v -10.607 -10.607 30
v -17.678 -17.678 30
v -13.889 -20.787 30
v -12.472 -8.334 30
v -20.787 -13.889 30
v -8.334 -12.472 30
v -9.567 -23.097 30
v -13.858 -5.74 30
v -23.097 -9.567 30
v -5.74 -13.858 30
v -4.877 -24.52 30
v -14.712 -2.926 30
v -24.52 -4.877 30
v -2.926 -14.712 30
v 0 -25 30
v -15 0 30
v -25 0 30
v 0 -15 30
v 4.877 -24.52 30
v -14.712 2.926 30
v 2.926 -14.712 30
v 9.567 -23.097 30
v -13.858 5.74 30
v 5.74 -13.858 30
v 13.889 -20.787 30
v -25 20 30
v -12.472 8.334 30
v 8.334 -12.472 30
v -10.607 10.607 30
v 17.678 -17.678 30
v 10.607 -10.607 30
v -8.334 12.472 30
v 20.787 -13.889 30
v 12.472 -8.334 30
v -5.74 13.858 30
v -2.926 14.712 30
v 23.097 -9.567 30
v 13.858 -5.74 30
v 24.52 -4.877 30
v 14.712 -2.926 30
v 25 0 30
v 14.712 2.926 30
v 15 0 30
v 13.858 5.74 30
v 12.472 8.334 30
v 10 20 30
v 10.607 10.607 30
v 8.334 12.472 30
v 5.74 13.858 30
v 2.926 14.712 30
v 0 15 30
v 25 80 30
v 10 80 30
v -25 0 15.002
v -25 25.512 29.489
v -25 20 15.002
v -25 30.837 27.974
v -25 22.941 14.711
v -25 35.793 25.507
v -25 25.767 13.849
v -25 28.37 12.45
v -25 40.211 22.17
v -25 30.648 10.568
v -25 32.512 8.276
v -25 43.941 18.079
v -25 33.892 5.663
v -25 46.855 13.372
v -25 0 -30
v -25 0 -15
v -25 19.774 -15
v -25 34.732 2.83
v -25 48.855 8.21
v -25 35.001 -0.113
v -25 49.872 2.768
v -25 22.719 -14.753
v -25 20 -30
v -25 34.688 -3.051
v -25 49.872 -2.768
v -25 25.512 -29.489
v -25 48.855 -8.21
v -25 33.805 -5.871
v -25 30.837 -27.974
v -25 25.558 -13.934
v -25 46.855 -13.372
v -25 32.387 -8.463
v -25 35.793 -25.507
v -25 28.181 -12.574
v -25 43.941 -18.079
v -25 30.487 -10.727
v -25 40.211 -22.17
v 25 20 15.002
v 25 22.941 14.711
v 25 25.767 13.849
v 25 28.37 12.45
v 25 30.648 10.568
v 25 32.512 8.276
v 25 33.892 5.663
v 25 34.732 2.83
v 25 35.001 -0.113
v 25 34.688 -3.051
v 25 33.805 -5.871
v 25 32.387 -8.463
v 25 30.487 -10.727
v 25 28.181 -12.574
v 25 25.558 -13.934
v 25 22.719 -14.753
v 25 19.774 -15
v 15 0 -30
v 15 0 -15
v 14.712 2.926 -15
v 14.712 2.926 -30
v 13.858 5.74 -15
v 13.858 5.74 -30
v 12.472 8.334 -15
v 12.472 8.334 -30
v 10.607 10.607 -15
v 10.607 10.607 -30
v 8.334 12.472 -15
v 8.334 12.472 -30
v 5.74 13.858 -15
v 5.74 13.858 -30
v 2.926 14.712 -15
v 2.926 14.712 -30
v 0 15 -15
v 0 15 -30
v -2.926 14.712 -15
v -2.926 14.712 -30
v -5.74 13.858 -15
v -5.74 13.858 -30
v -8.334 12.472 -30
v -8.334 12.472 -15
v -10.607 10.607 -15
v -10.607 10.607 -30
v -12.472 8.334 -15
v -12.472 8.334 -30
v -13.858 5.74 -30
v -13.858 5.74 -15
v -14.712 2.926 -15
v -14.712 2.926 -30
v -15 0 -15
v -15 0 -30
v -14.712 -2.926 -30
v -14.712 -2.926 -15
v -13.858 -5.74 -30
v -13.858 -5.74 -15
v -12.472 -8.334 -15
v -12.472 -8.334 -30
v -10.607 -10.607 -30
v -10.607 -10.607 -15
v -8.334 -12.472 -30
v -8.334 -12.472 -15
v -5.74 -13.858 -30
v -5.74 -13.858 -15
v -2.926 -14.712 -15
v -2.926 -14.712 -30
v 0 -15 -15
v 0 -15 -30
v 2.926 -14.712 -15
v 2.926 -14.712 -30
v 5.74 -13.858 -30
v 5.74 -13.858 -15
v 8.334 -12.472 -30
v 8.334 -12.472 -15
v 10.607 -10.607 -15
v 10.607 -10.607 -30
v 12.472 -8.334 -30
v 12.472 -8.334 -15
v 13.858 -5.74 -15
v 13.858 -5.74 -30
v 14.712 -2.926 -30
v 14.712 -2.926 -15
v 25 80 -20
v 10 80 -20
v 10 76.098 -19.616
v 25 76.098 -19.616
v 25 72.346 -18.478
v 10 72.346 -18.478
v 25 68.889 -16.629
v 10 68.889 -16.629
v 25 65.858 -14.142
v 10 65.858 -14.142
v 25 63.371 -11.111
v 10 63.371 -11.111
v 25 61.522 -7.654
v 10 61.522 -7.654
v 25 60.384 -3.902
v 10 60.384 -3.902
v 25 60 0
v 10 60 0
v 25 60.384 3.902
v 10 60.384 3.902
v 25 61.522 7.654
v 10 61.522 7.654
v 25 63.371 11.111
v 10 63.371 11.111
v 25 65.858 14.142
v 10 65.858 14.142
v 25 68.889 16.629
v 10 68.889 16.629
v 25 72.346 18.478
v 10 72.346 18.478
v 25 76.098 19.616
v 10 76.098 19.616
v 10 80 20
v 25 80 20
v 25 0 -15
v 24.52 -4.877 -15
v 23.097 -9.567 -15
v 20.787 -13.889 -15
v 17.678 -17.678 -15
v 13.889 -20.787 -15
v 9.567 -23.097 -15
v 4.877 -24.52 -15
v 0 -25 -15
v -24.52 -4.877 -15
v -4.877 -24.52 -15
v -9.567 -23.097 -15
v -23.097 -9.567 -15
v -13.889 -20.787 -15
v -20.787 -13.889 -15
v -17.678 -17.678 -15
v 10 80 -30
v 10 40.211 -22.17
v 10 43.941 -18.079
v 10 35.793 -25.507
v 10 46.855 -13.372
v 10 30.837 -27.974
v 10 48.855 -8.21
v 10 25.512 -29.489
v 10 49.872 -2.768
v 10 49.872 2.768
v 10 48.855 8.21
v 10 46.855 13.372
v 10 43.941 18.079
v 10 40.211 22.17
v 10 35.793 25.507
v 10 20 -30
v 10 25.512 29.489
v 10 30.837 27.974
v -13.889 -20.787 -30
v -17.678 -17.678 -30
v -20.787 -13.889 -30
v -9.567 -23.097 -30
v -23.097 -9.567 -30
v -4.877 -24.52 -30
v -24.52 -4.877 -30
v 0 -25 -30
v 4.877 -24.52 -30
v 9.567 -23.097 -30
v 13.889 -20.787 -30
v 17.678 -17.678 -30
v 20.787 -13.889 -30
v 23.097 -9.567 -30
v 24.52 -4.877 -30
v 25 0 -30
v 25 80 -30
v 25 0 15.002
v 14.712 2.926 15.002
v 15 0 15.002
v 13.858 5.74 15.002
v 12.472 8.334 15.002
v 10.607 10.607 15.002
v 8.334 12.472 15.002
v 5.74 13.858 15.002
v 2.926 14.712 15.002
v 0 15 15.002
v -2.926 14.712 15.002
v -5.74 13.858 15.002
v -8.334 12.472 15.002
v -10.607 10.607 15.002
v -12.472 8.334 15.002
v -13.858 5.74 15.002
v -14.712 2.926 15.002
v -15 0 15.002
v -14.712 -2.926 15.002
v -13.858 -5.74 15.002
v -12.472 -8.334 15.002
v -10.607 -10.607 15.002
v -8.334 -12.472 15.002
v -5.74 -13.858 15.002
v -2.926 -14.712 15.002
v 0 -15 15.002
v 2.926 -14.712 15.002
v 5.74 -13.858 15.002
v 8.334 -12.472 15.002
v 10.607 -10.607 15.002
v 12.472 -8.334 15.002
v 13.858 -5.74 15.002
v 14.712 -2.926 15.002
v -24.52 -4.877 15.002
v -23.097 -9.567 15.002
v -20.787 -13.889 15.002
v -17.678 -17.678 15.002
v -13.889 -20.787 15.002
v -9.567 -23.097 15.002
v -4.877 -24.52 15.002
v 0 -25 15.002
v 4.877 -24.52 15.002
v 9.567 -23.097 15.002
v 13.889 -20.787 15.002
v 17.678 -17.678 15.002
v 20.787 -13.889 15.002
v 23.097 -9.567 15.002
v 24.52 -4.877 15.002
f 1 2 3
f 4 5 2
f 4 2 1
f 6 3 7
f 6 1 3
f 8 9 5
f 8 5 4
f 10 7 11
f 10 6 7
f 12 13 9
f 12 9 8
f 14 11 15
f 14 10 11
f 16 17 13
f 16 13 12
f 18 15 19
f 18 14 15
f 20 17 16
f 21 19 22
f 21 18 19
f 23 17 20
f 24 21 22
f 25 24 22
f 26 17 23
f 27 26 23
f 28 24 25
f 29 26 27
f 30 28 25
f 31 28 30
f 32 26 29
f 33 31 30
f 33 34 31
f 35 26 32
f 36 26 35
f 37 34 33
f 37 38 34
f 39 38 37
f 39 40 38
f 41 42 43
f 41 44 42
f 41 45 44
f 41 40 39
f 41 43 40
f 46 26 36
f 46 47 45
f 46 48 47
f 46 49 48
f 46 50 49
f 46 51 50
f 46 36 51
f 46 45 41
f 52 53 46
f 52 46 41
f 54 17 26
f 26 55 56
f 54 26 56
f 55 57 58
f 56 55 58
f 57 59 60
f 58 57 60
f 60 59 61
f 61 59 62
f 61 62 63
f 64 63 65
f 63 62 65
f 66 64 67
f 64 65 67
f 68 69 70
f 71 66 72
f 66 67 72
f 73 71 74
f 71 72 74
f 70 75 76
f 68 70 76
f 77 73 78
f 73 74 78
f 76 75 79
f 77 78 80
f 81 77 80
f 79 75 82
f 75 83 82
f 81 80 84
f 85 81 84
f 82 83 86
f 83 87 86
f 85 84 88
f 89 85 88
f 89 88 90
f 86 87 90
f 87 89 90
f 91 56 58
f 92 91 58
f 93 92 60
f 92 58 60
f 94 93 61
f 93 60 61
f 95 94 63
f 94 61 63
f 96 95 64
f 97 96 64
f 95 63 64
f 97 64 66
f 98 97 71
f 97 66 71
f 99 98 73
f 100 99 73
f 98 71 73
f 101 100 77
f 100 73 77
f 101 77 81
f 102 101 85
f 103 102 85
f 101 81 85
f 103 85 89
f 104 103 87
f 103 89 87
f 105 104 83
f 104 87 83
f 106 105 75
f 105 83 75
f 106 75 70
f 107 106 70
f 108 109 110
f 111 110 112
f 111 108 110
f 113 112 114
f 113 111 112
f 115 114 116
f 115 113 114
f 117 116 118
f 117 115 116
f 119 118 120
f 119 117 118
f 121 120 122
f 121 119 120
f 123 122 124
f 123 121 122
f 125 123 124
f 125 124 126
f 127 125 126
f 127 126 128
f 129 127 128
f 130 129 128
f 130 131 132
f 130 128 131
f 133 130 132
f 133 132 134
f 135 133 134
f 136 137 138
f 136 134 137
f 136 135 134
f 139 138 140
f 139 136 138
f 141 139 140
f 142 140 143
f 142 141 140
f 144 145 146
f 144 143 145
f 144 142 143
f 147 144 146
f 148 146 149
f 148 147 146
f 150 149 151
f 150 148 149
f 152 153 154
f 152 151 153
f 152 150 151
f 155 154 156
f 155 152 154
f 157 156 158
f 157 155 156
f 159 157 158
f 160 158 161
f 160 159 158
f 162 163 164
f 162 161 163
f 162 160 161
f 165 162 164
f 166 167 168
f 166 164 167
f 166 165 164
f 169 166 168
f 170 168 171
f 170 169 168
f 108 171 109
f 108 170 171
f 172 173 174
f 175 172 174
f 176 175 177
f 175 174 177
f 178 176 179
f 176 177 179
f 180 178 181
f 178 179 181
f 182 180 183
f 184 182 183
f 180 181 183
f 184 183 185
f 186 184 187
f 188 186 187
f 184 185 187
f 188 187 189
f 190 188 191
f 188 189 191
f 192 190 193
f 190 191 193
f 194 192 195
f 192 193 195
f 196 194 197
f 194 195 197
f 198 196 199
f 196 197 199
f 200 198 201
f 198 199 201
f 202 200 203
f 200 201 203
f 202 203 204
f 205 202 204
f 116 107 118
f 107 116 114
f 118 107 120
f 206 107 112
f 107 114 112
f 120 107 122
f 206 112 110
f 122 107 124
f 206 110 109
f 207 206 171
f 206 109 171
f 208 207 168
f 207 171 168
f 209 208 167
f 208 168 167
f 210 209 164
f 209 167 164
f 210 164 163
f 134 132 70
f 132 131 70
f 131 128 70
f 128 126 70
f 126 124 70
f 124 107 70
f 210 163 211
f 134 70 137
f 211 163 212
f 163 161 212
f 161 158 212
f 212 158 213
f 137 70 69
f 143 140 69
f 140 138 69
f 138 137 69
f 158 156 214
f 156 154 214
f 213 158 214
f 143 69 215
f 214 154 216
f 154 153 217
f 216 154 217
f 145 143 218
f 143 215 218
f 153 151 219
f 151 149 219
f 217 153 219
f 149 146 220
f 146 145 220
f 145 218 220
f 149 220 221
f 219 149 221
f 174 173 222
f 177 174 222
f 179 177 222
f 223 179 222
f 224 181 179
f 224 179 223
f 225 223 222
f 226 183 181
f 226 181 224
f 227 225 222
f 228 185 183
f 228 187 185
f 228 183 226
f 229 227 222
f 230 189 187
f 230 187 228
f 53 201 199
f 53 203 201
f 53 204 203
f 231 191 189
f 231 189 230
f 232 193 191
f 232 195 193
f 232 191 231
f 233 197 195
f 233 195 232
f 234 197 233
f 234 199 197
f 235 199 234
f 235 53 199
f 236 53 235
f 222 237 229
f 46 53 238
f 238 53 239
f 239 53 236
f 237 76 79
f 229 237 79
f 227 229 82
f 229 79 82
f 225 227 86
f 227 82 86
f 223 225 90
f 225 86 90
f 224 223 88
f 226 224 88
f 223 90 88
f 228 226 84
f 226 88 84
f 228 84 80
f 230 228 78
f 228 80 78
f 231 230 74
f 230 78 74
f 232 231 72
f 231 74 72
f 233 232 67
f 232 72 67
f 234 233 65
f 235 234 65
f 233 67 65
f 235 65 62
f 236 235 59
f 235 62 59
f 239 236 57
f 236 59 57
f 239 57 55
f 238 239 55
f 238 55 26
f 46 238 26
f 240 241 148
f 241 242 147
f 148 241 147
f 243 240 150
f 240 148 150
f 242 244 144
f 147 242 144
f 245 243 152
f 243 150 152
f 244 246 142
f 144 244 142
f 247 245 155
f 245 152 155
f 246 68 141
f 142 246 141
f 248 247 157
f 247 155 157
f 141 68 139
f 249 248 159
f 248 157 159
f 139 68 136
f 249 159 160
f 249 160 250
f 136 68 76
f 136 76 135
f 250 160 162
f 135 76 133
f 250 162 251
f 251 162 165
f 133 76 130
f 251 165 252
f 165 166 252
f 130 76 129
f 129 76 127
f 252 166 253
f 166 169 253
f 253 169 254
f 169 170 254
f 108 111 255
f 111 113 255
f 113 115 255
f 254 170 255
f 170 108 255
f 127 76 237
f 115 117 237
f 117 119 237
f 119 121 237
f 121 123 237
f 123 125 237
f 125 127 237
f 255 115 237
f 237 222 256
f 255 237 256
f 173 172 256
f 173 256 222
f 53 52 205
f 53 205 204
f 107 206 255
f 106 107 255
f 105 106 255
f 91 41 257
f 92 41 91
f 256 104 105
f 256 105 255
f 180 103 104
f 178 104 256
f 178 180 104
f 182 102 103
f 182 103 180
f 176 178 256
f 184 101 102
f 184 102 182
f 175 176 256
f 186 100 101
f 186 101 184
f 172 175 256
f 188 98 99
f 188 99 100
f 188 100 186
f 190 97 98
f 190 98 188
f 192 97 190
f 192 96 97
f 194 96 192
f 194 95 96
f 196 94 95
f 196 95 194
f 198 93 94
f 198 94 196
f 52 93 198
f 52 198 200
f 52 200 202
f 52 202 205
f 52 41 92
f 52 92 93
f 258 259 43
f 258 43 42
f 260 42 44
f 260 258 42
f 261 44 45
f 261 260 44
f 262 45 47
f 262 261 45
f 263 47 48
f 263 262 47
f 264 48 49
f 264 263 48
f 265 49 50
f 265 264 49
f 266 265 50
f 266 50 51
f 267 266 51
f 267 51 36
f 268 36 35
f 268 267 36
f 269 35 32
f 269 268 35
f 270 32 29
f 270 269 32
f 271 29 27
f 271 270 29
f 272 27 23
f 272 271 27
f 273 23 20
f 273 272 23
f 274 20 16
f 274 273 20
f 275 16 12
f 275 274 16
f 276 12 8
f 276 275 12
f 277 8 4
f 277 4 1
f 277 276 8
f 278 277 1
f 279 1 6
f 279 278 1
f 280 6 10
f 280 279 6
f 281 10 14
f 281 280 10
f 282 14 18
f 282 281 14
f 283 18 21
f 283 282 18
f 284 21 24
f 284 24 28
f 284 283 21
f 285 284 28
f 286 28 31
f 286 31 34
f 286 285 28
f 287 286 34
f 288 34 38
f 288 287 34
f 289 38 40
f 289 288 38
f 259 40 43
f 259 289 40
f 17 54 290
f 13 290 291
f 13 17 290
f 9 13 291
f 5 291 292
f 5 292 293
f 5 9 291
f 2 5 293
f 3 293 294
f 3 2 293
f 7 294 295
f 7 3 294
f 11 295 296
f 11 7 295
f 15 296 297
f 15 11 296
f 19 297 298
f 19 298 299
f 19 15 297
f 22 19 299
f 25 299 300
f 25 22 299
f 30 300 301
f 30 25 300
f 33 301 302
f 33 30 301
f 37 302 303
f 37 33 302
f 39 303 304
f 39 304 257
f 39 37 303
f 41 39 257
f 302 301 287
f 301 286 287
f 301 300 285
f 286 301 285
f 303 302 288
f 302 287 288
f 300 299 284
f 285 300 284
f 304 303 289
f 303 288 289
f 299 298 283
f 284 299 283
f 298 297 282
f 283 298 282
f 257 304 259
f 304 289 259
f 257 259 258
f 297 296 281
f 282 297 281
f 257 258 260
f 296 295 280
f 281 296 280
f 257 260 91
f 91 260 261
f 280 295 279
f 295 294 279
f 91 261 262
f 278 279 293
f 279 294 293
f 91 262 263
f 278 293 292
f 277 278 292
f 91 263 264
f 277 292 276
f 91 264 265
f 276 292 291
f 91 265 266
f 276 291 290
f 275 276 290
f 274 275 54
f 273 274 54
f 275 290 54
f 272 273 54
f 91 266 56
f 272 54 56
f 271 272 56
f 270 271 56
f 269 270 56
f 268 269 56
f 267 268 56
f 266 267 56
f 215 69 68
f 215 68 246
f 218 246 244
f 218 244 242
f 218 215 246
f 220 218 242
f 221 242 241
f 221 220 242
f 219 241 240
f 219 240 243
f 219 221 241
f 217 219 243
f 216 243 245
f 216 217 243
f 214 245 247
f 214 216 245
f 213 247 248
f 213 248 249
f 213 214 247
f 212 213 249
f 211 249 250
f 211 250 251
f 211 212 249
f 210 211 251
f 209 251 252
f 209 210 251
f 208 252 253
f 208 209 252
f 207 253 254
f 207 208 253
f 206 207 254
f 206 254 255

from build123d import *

# Parameters (mm, degrees)
SKETCH1_R           = 15
BOSS_EXTRUDE1_DEPTH = 30
SKETCH2_R           = 20
CUT_EXTRUDE1_DEPTH  = 16
BOSS_EXTRUDE2_DEPTH = 35
CUT_EXTRUDE3_DEPTH  = 51


with BuildPart() as part:
    # Sketch1 → Boss-Extrude1 (new body, symmetric)
    with BuildSketch(Plane.XY):
        with BuildLine():
            Line((25, 0), (25, 80))
            Line((25, 80), (10, 80))
            Line((10, 80), (10, 22.912878475))
            Line((10, 22.912878475), (10, 20))
            Line((10, 20), (-25, 20))
            Line((-25, 20), (-25, 0))
            ThreePointArc((-25, 0), (0, -25), (25, 0))
        make_face()
        Circle(SKETCH1_R, mode=Mode.SUBTRACT)
    extrude(amount=BOSS_EXTRUDE1_DEPTH, both=True)

    # Sketch2 → Cut-Extrude1 (cut, through all)
    with BuildSketch(Plane.ZY.offset(-10)):
        with Locations((0, 80)):
            Circle(SKETCH2_R)
    extrude(amount=-CUT_EXTRUDE1_DEPTH, mode=Mode.SUBTRACT)

    # Sketch4 → Boss-Extrude2 (add)
    with BuildSketch(Plane.ZY.offset(25)):
        with BuildLine():
            Line((-15, 20), (-30, 20))
            ThreePointArc((-30, 20), (0, 50), (30, 20))
            Line((30, 20), (15, 20))
            ThreePointArc((15, 20), (0, 35), (-15, 20))
        make_face()
    extrude(amount=-BOSS_EXTRUDE2_DEPTH)

    # Sketch5 → Cut-Extrude3 (cut, through all)
    with BuildSketch(Plane.ZY.offset(25)):
        with BuildLine():
            Line((-15, 19.774418989), (-15, -47.367007727))
            Line((-15, -47.367007727), (15.001696131, -47.367007727))
            Line((15.001696131, -47.367007727), (15.001696131, -44.584519051))
            Line((15.001696131, -44.584519051), (15.001696131, 20))
            ThreePointArc((15.001696131, 20), (-0.112793694, 35.001272092), (-15, 19.774418989))
        make_face()
    extrude(amount=-CUT_EXTRUDE3_DEPTH, mode=Mode.SUBTRACT)


solid = part.part
